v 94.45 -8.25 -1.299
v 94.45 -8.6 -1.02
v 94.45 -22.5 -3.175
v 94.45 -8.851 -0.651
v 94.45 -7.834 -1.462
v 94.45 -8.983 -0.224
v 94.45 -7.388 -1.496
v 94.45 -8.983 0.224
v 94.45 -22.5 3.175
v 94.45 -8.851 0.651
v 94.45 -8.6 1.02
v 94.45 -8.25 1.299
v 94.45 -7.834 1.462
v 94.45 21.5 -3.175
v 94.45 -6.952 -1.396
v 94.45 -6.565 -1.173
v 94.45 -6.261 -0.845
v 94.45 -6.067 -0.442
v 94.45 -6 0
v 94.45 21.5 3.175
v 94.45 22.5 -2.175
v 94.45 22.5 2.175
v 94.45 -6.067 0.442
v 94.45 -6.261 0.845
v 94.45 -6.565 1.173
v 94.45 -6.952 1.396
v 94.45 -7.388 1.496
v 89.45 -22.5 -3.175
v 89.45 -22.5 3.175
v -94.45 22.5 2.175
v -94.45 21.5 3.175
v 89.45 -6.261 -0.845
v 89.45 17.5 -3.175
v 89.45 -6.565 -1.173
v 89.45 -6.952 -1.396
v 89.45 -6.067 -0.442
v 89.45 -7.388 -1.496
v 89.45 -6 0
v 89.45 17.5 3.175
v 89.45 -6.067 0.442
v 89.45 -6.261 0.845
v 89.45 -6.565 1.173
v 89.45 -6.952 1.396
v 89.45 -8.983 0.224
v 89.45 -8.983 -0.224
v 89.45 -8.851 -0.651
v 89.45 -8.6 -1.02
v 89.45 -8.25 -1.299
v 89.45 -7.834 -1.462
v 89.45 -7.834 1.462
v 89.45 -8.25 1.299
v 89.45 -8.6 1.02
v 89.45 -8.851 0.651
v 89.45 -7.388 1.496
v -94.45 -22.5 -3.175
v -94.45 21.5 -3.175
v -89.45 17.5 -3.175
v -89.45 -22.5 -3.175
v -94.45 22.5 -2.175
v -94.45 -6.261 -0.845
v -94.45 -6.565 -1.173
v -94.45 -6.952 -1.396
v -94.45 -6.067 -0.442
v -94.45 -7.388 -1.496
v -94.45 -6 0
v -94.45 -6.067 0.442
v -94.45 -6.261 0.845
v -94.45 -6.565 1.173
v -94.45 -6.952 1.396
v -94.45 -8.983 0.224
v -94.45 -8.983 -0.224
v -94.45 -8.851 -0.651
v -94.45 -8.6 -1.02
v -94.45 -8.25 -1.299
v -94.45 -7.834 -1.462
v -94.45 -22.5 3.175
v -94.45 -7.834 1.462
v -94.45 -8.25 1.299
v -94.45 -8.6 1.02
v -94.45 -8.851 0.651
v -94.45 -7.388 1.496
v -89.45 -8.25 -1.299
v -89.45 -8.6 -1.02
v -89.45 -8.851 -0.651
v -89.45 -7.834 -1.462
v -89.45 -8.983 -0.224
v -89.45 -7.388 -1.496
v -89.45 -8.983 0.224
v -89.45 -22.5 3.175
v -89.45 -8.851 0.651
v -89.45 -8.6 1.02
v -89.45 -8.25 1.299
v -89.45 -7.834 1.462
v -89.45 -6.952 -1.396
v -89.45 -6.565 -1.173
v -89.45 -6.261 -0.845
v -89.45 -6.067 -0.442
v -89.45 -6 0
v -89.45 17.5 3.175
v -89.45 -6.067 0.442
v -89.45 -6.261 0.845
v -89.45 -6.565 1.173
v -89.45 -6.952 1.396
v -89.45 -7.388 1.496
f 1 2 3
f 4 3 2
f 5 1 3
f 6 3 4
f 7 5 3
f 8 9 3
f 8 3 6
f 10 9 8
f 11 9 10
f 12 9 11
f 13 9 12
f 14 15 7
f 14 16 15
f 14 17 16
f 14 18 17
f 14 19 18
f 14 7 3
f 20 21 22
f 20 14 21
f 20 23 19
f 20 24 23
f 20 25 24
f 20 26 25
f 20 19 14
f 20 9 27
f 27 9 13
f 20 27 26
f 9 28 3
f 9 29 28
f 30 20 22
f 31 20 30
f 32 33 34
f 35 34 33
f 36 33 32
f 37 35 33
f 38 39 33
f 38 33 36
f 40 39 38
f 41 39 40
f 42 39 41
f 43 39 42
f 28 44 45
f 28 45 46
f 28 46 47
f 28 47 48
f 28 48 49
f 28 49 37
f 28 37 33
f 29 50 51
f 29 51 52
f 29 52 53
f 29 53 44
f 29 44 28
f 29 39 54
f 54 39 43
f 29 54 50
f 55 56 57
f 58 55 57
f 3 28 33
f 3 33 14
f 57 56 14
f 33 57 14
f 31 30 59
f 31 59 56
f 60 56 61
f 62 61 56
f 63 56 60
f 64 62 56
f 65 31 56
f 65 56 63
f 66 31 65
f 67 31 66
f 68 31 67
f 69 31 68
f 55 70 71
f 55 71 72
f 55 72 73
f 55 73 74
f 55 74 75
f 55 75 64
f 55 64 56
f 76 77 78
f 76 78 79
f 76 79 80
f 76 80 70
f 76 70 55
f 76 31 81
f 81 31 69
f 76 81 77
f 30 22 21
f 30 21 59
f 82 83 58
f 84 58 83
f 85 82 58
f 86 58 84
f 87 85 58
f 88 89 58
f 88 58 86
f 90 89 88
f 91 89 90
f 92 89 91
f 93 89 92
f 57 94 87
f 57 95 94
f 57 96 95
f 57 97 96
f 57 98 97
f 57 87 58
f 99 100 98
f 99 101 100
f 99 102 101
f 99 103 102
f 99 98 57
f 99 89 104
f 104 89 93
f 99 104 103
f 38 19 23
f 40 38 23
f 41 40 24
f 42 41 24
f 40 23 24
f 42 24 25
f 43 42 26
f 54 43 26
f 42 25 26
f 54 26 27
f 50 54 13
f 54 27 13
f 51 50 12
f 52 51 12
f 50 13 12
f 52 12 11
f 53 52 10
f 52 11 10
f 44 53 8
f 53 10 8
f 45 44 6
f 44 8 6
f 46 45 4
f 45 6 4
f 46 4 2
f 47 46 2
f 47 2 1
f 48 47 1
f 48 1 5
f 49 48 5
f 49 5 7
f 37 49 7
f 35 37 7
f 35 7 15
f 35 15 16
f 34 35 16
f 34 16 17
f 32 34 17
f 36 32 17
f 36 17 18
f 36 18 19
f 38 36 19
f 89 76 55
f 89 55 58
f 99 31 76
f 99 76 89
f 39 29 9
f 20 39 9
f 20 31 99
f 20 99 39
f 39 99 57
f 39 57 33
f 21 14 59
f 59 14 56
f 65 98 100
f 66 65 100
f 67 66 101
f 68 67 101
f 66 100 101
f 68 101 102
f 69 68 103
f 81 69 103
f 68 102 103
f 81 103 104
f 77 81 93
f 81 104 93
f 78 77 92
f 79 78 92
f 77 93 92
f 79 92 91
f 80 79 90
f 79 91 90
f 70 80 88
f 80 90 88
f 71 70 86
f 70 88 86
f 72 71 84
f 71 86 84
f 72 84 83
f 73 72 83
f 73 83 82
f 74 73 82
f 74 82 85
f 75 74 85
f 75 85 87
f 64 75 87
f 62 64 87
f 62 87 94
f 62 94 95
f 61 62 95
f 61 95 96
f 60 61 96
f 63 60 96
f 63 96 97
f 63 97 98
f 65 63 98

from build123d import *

# Parameters (mm, degrees)
F1_DEPTH = 3.175
F3_D     = 3
F4_SIZE2 = 1
F4_SIZE  = 1
F5_SIZE2 = 1
F5_SIZE  = 1


with BuildPart() as f1:
    # F0 (on Top) → F1 (new body, symmetric)
    with BuildSketch(Plane.XY):
        Polygon((94.45, -22.5), (94.45, 22.5), (-94.45, 22.5), (-94.45, -22.5), (-89.45, -22.5), (-89.45, -15.1735553518), (-89.45, 15.1735553518), (-89.45, 17.5), (89.45, 17.5), (89.45, 15.1735553518), (89.45, -15.1735553518), (89.45, -22.5), align=None)
    extrude(amount=F1_DEPTH, both=True)

    # F3 (through all)
    with Locations(Plane(origin=(-94.45, 0, 0), x_dir=(0, -1, 0), z_dir=(-1, 0, 0))):
        with Locations((7.5, 0)):
            Hole(F3_D / 2)

    # F4
    f4_edges = [f1.edges().sort_by_distance(p)[0] for p in [
        (0, 22.5, 3.175),
    ]]
    chamfer(f4_edges, length=F4_SIZE, length2=F4_SIZE2)

    # F5
    f5_edges = [f1.edges().sort_by_distance(p)[0] for p in [
        (0, 22.5, -3.175),
    ]]
    chamfer(f5_edges, length=F5_SIZE, length2=F5_SIZE2)


solid = f1.part
